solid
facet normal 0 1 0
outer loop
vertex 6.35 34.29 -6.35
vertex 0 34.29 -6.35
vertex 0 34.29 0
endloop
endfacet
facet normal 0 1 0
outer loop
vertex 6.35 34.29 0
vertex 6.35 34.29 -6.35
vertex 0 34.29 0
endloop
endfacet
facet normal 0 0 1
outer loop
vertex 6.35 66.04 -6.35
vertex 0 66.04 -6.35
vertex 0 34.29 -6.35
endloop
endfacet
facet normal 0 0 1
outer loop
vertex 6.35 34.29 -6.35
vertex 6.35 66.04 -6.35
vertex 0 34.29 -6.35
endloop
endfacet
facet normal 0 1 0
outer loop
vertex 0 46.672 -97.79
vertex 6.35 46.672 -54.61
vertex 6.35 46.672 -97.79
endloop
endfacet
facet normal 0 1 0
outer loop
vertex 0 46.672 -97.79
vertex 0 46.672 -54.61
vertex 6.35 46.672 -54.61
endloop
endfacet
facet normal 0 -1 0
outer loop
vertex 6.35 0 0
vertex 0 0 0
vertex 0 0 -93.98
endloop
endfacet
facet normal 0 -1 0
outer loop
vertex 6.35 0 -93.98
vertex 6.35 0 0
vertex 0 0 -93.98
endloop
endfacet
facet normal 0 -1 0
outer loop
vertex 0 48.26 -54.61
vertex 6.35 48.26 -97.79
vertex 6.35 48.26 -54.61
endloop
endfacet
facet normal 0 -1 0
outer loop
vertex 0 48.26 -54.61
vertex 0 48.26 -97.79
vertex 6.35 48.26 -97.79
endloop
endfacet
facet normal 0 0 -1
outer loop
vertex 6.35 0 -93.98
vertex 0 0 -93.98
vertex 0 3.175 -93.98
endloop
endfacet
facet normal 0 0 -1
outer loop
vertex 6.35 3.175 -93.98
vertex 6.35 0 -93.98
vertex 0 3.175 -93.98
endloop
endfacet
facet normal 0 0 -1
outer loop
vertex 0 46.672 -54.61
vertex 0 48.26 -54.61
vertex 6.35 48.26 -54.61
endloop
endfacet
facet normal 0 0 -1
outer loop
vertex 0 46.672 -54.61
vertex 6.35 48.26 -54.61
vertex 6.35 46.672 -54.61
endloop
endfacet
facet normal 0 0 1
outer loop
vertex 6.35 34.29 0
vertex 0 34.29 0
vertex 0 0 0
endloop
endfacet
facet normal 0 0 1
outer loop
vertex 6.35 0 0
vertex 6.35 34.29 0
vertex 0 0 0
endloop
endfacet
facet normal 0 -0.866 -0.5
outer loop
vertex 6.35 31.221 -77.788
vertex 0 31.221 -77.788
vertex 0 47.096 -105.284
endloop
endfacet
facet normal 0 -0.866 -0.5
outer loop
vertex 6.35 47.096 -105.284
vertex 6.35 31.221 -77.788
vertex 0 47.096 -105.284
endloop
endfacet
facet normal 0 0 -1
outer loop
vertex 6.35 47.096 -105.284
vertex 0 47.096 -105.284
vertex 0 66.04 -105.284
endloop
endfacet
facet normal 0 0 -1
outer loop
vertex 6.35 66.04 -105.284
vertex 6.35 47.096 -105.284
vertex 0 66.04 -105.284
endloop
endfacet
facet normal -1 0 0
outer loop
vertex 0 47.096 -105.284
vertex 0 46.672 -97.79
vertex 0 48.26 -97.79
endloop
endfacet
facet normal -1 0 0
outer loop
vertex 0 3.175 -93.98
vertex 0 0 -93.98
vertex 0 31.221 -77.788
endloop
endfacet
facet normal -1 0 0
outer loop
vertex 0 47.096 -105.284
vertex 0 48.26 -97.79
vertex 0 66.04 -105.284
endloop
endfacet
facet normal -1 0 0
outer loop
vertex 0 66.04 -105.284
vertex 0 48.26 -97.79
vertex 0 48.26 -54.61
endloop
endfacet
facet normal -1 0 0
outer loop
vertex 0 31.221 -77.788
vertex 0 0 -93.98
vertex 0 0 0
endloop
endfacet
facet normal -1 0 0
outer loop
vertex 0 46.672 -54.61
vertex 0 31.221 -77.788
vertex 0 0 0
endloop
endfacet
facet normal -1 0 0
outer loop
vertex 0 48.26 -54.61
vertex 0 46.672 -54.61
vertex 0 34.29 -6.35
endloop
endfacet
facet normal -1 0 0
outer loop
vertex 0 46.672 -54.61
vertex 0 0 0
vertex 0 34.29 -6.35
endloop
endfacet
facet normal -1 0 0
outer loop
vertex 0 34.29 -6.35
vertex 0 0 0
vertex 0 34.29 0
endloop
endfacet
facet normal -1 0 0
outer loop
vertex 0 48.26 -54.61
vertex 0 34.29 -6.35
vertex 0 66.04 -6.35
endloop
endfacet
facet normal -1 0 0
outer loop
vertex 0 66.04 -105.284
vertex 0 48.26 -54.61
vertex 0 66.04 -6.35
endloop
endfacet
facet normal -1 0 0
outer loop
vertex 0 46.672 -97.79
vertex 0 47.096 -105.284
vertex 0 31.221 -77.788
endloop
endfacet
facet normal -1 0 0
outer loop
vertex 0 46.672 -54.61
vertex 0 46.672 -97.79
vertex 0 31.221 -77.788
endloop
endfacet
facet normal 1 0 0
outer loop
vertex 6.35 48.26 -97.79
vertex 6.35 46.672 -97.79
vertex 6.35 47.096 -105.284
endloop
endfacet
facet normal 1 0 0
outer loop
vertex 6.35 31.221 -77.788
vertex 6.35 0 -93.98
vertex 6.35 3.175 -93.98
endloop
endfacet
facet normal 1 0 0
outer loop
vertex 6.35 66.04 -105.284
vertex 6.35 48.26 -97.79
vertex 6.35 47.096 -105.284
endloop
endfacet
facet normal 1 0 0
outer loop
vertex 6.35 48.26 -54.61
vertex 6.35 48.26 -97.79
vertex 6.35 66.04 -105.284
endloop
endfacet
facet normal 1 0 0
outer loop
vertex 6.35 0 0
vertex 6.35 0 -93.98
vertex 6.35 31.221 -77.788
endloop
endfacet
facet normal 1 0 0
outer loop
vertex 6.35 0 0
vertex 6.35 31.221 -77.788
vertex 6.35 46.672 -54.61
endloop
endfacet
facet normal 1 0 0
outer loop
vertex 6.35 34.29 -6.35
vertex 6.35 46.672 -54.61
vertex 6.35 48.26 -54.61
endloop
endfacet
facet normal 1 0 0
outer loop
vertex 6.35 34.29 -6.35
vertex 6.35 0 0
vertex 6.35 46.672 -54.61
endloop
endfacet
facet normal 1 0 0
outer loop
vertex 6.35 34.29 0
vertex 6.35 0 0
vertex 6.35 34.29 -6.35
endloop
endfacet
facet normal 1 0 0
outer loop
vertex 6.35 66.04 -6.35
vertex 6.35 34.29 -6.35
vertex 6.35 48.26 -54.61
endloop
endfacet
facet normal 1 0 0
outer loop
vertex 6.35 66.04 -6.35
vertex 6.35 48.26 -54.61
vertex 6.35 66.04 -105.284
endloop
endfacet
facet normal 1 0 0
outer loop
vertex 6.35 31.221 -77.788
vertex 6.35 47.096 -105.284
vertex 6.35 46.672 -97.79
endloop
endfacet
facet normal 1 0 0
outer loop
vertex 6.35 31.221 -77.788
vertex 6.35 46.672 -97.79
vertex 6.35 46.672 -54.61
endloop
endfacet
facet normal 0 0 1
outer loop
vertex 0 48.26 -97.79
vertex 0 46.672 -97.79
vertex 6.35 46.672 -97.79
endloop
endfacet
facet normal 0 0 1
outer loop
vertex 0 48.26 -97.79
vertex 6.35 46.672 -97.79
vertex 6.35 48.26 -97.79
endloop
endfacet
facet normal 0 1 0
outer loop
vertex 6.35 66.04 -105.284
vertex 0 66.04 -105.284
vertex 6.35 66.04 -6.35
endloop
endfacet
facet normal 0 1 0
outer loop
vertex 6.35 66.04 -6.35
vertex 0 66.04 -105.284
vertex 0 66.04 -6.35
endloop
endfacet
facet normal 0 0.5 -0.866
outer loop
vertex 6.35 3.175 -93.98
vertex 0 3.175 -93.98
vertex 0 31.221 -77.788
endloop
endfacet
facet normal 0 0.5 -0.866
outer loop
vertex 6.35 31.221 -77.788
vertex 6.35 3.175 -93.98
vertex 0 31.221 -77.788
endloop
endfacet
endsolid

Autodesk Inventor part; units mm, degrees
ref_plane "YZ Plane" through (0, 0, 0) normal (1, 0, 0) x (0, 1, 0)
ref_plane "XZ Plane" through (0, 0, 0) normal (0, 1, 0) x (-1, 0, 0)
ref_plane "XY Plane" through (0, 0, 0) normal (0, 0, 1) x (1, 0, 0)
sketch "Sketch1" plane through (0, 0, 0) normal (1, 0, 0) x (0, 1, 0)
  line L0 (0, 0) -> (0, -93.98)
  line L1 (0, -93.98) -> (3.175, -93.98)
  line L2 (3.175, -93.98) -> (31.2212, -77.7875)
  line L3 (31.2212, -77.7875) -> (47.0962, -105.2838)
  line L4 (47.0962, -105.2838) -> (66.04, -105.2838)
  line L5 (66.04, -105.2838) -> (66.04, -6.35)
  line L6 (34.29, 0) -> (0, 0)
  line L7 (48.26, -54.61) -> (46.6725, -54.61)
  line L8 (46.6725, -54.61) -> (46.6725, -97.79)
  line L9 (46.6725, -97.79) -> (48.26, -97.79)
  line L10 (48.26, -97.79) -> (48.26, -54.61)
  line L11 (66.04, -6.35) -> (34.29, -6.35)
  line L12 (34.29, -6.35) -> (34.29, 0)
  dimension "d2" = 31.75
  dimension "d4" = 30
  dimension "d6" = 66.04
  dimension "d7" = 93.98
  dimension "d8" = 32.385
  dimension "d9" = 3.175
  dimension "d10" = 43.18
  dimension "d11" = 1.5875
  dimension "d13" = 54.61
  dimension "d16" = 6.35
  dimension "d17" = 31.75
  dimension "d18" = 48.26
extrude "Extrusion1" add sketch "Sketch1" along normal blind 6.35
properties part number "chute_wall"
